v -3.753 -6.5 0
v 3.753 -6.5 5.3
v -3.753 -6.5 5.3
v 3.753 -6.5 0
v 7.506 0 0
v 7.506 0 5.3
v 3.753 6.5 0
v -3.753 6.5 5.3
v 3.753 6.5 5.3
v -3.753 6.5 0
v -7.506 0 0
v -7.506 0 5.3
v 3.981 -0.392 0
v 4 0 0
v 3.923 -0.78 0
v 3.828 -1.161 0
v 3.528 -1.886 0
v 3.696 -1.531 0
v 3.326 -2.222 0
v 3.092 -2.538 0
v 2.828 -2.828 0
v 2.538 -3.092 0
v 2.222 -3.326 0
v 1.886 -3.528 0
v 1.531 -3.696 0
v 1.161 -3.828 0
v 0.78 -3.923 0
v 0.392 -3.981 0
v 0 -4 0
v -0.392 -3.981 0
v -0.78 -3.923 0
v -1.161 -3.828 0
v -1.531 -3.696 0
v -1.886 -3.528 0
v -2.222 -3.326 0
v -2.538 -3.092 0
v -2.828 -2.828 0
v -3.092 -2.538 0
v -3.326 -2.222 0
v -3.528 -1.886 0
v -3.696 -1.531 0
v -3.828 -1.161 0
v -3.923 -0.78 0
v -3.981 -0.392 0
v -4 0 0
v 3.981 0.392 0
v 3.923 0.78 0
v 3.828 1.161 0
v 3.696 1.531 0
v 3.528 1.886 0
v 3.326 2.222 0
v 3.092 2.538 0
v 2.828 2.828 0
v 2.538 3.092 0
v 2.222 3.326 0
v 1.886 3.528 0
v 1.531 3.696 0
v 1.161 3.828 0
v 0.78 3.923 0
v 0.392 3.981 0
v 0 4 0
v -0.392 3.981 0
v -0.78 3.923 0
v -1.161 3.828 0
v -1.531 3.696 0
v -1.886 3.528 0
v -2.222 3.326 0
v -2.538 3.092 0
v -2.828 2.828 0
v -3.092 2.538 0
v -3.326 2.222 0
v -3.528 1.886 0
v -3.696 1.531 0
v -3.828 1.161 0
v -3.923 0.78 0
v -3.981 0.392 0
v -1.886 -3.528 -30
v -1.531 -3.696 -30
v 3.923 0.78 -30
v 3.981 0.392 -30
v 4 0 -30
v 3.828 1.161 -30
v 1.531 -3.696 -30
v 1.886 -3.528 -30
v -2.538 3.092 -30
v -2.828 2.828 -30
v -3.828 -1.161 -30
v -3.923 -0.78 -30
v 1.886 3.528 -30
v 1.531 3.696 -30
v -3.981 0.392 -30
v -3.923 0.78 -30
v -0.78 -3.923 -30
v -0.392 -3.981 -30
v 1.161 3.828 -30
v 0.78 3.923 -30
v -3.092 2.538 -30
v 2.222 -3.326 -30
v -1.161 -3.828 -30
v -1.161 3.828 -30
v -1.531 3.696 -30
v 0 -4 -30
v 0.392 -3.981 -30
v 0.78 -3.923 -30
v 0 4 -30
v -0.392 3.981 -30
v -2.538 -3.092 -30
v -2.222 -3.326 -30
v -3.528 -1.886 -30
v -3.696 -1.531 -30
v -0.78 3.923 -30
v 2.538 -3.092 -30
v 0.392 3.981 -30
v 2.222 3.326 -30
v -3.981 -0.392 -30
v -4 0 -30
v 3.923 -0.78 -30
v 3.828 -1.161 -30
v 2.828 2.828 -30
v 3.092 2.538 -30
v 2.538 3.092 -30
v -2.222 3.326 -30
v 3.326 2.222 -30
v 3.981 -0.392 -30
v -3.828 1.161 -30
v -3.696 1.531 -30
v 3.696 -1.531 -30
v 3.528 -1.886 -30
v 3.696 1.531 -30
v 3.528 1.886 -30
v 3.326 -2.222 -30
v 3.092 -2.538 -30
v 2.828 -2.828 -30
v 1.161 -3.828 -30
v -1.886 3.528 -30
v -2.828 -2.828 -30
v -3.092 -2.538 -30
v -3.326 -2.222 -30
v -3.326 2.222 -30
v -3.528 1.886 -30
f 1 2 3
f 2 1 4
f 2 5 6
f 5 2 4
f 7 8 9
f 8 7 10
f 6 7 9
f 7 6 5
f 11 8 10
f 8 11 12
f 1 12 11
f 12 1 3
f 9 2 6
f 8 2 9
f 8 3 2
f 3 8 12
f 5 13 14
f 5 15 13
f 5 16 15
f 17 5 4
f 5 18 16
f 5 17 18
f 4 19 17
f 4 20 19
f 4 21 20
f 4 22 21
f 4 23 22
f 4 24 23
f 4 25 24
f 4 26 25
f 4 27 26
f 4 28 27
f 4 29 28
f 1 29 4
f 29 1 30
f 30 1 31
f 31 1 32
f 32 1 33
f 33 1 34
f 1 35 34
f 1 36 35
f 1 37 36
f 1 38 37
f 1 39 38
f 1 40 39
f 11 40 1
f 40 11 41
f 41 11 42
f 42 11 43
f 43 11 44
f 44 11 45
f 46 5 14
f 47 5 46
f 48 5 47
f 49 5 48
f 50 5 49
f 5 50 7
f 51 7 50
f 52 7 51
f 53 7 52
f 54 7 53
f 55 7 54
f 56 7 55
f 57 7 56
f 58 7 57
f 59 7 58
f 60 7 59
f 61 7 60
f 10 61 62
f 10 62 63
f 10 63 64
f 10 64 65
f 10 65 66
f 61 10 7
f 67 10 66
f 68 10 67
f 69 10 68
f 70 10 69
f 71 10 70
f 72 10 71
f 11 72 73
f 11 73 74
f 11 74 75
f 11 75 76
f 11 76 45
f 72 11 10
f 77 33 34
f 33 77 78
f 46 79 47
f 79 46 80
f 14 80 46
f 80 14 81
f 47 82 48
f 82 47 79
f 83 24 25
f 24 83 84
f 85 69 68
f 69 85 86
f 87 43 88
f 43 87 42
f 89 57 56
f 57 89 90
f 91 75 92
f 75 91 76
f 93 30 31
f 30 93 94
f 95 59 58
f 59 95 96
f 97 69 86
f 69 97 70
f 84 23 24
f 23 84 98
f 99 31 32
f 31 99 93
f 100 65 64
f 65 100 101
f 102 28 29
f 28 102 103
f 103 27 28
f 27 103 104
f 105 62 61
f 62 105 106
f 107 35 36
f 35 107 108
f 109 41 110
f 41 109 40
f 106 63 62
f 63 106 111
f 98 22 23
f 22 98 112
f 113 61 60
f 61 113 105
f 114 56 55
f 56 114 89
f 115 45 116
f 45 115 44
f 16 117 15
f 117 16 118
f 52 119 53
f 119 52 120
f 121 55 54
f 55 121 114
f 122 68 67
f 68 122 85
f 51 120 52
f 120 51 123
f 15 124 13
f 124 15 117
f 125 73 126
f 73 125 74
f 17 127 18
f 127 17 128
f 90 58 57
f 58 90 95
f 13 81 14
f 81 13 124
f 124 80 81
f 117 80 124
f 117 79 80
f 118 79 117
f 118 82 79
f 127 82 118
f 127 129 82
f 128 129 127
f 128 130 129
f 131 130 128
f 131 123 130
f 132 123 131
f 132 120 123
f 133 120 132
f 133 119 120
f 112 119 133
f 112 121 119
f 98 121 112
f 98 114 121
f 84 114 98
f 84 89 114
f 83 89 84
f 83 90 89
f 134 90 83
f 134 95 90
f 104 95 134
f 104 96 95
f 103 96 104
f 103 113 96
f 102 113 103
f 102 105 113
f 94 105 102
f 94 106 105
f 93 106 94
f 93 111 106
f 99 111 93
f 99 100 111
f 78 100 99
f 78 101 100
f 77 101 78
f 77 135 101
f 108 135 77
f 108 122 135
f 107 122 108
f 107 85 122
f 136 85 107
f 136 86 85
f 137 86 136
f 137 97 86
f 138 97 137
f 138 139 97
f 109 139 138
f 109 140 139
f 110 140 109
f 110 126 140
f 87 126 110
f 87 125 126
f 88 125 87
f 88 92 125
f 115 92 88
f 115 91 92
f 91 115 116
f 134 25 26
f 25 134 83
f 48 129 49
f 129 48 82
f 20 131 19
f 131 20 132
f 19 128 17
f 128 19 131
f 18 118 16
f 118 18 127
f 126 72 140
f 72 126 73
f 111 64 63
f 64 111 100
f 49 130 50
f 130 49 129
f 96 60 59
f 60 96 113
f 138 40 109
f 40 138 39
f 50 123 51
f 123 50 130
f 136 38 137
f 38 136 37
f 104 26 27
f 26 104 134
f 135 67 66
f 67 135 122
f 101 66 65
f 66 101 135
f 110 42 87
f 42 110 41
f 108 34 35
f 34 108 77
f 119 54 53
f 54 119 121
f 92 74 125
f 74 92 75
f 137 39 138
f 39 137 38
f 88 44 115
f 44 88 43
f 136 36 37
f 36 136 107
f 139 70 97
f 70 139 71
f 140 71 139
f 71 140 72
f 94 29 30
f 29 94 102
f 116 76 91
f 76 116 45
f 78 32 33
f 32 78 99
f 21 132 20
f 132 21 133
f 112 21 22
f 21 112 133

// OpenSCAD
$fn = 64;

// M8 hex bolt (thread omitted)
// Head: hex prism, across flats = 13 mm, height = 5.3 mm
// Shank: cylinder, diameter = 8 mm, length = 30 mm
// Head bottom face at z = 0, shank extends toward negative Z

head_af = 13;
head_h = 5.3;
shank_d = 8;
shank_l = 30;

// For a regular hexagon, across flats = sqrt(3) * circumradius
hex_r = head_af / sqrt(3);

union() {
    cylinder(h = head_h, r = hex_r, $fn = 6);
    translate([0, 0, -shank_l])
        cylinder(h = shank_l, d = shank_d);
}
